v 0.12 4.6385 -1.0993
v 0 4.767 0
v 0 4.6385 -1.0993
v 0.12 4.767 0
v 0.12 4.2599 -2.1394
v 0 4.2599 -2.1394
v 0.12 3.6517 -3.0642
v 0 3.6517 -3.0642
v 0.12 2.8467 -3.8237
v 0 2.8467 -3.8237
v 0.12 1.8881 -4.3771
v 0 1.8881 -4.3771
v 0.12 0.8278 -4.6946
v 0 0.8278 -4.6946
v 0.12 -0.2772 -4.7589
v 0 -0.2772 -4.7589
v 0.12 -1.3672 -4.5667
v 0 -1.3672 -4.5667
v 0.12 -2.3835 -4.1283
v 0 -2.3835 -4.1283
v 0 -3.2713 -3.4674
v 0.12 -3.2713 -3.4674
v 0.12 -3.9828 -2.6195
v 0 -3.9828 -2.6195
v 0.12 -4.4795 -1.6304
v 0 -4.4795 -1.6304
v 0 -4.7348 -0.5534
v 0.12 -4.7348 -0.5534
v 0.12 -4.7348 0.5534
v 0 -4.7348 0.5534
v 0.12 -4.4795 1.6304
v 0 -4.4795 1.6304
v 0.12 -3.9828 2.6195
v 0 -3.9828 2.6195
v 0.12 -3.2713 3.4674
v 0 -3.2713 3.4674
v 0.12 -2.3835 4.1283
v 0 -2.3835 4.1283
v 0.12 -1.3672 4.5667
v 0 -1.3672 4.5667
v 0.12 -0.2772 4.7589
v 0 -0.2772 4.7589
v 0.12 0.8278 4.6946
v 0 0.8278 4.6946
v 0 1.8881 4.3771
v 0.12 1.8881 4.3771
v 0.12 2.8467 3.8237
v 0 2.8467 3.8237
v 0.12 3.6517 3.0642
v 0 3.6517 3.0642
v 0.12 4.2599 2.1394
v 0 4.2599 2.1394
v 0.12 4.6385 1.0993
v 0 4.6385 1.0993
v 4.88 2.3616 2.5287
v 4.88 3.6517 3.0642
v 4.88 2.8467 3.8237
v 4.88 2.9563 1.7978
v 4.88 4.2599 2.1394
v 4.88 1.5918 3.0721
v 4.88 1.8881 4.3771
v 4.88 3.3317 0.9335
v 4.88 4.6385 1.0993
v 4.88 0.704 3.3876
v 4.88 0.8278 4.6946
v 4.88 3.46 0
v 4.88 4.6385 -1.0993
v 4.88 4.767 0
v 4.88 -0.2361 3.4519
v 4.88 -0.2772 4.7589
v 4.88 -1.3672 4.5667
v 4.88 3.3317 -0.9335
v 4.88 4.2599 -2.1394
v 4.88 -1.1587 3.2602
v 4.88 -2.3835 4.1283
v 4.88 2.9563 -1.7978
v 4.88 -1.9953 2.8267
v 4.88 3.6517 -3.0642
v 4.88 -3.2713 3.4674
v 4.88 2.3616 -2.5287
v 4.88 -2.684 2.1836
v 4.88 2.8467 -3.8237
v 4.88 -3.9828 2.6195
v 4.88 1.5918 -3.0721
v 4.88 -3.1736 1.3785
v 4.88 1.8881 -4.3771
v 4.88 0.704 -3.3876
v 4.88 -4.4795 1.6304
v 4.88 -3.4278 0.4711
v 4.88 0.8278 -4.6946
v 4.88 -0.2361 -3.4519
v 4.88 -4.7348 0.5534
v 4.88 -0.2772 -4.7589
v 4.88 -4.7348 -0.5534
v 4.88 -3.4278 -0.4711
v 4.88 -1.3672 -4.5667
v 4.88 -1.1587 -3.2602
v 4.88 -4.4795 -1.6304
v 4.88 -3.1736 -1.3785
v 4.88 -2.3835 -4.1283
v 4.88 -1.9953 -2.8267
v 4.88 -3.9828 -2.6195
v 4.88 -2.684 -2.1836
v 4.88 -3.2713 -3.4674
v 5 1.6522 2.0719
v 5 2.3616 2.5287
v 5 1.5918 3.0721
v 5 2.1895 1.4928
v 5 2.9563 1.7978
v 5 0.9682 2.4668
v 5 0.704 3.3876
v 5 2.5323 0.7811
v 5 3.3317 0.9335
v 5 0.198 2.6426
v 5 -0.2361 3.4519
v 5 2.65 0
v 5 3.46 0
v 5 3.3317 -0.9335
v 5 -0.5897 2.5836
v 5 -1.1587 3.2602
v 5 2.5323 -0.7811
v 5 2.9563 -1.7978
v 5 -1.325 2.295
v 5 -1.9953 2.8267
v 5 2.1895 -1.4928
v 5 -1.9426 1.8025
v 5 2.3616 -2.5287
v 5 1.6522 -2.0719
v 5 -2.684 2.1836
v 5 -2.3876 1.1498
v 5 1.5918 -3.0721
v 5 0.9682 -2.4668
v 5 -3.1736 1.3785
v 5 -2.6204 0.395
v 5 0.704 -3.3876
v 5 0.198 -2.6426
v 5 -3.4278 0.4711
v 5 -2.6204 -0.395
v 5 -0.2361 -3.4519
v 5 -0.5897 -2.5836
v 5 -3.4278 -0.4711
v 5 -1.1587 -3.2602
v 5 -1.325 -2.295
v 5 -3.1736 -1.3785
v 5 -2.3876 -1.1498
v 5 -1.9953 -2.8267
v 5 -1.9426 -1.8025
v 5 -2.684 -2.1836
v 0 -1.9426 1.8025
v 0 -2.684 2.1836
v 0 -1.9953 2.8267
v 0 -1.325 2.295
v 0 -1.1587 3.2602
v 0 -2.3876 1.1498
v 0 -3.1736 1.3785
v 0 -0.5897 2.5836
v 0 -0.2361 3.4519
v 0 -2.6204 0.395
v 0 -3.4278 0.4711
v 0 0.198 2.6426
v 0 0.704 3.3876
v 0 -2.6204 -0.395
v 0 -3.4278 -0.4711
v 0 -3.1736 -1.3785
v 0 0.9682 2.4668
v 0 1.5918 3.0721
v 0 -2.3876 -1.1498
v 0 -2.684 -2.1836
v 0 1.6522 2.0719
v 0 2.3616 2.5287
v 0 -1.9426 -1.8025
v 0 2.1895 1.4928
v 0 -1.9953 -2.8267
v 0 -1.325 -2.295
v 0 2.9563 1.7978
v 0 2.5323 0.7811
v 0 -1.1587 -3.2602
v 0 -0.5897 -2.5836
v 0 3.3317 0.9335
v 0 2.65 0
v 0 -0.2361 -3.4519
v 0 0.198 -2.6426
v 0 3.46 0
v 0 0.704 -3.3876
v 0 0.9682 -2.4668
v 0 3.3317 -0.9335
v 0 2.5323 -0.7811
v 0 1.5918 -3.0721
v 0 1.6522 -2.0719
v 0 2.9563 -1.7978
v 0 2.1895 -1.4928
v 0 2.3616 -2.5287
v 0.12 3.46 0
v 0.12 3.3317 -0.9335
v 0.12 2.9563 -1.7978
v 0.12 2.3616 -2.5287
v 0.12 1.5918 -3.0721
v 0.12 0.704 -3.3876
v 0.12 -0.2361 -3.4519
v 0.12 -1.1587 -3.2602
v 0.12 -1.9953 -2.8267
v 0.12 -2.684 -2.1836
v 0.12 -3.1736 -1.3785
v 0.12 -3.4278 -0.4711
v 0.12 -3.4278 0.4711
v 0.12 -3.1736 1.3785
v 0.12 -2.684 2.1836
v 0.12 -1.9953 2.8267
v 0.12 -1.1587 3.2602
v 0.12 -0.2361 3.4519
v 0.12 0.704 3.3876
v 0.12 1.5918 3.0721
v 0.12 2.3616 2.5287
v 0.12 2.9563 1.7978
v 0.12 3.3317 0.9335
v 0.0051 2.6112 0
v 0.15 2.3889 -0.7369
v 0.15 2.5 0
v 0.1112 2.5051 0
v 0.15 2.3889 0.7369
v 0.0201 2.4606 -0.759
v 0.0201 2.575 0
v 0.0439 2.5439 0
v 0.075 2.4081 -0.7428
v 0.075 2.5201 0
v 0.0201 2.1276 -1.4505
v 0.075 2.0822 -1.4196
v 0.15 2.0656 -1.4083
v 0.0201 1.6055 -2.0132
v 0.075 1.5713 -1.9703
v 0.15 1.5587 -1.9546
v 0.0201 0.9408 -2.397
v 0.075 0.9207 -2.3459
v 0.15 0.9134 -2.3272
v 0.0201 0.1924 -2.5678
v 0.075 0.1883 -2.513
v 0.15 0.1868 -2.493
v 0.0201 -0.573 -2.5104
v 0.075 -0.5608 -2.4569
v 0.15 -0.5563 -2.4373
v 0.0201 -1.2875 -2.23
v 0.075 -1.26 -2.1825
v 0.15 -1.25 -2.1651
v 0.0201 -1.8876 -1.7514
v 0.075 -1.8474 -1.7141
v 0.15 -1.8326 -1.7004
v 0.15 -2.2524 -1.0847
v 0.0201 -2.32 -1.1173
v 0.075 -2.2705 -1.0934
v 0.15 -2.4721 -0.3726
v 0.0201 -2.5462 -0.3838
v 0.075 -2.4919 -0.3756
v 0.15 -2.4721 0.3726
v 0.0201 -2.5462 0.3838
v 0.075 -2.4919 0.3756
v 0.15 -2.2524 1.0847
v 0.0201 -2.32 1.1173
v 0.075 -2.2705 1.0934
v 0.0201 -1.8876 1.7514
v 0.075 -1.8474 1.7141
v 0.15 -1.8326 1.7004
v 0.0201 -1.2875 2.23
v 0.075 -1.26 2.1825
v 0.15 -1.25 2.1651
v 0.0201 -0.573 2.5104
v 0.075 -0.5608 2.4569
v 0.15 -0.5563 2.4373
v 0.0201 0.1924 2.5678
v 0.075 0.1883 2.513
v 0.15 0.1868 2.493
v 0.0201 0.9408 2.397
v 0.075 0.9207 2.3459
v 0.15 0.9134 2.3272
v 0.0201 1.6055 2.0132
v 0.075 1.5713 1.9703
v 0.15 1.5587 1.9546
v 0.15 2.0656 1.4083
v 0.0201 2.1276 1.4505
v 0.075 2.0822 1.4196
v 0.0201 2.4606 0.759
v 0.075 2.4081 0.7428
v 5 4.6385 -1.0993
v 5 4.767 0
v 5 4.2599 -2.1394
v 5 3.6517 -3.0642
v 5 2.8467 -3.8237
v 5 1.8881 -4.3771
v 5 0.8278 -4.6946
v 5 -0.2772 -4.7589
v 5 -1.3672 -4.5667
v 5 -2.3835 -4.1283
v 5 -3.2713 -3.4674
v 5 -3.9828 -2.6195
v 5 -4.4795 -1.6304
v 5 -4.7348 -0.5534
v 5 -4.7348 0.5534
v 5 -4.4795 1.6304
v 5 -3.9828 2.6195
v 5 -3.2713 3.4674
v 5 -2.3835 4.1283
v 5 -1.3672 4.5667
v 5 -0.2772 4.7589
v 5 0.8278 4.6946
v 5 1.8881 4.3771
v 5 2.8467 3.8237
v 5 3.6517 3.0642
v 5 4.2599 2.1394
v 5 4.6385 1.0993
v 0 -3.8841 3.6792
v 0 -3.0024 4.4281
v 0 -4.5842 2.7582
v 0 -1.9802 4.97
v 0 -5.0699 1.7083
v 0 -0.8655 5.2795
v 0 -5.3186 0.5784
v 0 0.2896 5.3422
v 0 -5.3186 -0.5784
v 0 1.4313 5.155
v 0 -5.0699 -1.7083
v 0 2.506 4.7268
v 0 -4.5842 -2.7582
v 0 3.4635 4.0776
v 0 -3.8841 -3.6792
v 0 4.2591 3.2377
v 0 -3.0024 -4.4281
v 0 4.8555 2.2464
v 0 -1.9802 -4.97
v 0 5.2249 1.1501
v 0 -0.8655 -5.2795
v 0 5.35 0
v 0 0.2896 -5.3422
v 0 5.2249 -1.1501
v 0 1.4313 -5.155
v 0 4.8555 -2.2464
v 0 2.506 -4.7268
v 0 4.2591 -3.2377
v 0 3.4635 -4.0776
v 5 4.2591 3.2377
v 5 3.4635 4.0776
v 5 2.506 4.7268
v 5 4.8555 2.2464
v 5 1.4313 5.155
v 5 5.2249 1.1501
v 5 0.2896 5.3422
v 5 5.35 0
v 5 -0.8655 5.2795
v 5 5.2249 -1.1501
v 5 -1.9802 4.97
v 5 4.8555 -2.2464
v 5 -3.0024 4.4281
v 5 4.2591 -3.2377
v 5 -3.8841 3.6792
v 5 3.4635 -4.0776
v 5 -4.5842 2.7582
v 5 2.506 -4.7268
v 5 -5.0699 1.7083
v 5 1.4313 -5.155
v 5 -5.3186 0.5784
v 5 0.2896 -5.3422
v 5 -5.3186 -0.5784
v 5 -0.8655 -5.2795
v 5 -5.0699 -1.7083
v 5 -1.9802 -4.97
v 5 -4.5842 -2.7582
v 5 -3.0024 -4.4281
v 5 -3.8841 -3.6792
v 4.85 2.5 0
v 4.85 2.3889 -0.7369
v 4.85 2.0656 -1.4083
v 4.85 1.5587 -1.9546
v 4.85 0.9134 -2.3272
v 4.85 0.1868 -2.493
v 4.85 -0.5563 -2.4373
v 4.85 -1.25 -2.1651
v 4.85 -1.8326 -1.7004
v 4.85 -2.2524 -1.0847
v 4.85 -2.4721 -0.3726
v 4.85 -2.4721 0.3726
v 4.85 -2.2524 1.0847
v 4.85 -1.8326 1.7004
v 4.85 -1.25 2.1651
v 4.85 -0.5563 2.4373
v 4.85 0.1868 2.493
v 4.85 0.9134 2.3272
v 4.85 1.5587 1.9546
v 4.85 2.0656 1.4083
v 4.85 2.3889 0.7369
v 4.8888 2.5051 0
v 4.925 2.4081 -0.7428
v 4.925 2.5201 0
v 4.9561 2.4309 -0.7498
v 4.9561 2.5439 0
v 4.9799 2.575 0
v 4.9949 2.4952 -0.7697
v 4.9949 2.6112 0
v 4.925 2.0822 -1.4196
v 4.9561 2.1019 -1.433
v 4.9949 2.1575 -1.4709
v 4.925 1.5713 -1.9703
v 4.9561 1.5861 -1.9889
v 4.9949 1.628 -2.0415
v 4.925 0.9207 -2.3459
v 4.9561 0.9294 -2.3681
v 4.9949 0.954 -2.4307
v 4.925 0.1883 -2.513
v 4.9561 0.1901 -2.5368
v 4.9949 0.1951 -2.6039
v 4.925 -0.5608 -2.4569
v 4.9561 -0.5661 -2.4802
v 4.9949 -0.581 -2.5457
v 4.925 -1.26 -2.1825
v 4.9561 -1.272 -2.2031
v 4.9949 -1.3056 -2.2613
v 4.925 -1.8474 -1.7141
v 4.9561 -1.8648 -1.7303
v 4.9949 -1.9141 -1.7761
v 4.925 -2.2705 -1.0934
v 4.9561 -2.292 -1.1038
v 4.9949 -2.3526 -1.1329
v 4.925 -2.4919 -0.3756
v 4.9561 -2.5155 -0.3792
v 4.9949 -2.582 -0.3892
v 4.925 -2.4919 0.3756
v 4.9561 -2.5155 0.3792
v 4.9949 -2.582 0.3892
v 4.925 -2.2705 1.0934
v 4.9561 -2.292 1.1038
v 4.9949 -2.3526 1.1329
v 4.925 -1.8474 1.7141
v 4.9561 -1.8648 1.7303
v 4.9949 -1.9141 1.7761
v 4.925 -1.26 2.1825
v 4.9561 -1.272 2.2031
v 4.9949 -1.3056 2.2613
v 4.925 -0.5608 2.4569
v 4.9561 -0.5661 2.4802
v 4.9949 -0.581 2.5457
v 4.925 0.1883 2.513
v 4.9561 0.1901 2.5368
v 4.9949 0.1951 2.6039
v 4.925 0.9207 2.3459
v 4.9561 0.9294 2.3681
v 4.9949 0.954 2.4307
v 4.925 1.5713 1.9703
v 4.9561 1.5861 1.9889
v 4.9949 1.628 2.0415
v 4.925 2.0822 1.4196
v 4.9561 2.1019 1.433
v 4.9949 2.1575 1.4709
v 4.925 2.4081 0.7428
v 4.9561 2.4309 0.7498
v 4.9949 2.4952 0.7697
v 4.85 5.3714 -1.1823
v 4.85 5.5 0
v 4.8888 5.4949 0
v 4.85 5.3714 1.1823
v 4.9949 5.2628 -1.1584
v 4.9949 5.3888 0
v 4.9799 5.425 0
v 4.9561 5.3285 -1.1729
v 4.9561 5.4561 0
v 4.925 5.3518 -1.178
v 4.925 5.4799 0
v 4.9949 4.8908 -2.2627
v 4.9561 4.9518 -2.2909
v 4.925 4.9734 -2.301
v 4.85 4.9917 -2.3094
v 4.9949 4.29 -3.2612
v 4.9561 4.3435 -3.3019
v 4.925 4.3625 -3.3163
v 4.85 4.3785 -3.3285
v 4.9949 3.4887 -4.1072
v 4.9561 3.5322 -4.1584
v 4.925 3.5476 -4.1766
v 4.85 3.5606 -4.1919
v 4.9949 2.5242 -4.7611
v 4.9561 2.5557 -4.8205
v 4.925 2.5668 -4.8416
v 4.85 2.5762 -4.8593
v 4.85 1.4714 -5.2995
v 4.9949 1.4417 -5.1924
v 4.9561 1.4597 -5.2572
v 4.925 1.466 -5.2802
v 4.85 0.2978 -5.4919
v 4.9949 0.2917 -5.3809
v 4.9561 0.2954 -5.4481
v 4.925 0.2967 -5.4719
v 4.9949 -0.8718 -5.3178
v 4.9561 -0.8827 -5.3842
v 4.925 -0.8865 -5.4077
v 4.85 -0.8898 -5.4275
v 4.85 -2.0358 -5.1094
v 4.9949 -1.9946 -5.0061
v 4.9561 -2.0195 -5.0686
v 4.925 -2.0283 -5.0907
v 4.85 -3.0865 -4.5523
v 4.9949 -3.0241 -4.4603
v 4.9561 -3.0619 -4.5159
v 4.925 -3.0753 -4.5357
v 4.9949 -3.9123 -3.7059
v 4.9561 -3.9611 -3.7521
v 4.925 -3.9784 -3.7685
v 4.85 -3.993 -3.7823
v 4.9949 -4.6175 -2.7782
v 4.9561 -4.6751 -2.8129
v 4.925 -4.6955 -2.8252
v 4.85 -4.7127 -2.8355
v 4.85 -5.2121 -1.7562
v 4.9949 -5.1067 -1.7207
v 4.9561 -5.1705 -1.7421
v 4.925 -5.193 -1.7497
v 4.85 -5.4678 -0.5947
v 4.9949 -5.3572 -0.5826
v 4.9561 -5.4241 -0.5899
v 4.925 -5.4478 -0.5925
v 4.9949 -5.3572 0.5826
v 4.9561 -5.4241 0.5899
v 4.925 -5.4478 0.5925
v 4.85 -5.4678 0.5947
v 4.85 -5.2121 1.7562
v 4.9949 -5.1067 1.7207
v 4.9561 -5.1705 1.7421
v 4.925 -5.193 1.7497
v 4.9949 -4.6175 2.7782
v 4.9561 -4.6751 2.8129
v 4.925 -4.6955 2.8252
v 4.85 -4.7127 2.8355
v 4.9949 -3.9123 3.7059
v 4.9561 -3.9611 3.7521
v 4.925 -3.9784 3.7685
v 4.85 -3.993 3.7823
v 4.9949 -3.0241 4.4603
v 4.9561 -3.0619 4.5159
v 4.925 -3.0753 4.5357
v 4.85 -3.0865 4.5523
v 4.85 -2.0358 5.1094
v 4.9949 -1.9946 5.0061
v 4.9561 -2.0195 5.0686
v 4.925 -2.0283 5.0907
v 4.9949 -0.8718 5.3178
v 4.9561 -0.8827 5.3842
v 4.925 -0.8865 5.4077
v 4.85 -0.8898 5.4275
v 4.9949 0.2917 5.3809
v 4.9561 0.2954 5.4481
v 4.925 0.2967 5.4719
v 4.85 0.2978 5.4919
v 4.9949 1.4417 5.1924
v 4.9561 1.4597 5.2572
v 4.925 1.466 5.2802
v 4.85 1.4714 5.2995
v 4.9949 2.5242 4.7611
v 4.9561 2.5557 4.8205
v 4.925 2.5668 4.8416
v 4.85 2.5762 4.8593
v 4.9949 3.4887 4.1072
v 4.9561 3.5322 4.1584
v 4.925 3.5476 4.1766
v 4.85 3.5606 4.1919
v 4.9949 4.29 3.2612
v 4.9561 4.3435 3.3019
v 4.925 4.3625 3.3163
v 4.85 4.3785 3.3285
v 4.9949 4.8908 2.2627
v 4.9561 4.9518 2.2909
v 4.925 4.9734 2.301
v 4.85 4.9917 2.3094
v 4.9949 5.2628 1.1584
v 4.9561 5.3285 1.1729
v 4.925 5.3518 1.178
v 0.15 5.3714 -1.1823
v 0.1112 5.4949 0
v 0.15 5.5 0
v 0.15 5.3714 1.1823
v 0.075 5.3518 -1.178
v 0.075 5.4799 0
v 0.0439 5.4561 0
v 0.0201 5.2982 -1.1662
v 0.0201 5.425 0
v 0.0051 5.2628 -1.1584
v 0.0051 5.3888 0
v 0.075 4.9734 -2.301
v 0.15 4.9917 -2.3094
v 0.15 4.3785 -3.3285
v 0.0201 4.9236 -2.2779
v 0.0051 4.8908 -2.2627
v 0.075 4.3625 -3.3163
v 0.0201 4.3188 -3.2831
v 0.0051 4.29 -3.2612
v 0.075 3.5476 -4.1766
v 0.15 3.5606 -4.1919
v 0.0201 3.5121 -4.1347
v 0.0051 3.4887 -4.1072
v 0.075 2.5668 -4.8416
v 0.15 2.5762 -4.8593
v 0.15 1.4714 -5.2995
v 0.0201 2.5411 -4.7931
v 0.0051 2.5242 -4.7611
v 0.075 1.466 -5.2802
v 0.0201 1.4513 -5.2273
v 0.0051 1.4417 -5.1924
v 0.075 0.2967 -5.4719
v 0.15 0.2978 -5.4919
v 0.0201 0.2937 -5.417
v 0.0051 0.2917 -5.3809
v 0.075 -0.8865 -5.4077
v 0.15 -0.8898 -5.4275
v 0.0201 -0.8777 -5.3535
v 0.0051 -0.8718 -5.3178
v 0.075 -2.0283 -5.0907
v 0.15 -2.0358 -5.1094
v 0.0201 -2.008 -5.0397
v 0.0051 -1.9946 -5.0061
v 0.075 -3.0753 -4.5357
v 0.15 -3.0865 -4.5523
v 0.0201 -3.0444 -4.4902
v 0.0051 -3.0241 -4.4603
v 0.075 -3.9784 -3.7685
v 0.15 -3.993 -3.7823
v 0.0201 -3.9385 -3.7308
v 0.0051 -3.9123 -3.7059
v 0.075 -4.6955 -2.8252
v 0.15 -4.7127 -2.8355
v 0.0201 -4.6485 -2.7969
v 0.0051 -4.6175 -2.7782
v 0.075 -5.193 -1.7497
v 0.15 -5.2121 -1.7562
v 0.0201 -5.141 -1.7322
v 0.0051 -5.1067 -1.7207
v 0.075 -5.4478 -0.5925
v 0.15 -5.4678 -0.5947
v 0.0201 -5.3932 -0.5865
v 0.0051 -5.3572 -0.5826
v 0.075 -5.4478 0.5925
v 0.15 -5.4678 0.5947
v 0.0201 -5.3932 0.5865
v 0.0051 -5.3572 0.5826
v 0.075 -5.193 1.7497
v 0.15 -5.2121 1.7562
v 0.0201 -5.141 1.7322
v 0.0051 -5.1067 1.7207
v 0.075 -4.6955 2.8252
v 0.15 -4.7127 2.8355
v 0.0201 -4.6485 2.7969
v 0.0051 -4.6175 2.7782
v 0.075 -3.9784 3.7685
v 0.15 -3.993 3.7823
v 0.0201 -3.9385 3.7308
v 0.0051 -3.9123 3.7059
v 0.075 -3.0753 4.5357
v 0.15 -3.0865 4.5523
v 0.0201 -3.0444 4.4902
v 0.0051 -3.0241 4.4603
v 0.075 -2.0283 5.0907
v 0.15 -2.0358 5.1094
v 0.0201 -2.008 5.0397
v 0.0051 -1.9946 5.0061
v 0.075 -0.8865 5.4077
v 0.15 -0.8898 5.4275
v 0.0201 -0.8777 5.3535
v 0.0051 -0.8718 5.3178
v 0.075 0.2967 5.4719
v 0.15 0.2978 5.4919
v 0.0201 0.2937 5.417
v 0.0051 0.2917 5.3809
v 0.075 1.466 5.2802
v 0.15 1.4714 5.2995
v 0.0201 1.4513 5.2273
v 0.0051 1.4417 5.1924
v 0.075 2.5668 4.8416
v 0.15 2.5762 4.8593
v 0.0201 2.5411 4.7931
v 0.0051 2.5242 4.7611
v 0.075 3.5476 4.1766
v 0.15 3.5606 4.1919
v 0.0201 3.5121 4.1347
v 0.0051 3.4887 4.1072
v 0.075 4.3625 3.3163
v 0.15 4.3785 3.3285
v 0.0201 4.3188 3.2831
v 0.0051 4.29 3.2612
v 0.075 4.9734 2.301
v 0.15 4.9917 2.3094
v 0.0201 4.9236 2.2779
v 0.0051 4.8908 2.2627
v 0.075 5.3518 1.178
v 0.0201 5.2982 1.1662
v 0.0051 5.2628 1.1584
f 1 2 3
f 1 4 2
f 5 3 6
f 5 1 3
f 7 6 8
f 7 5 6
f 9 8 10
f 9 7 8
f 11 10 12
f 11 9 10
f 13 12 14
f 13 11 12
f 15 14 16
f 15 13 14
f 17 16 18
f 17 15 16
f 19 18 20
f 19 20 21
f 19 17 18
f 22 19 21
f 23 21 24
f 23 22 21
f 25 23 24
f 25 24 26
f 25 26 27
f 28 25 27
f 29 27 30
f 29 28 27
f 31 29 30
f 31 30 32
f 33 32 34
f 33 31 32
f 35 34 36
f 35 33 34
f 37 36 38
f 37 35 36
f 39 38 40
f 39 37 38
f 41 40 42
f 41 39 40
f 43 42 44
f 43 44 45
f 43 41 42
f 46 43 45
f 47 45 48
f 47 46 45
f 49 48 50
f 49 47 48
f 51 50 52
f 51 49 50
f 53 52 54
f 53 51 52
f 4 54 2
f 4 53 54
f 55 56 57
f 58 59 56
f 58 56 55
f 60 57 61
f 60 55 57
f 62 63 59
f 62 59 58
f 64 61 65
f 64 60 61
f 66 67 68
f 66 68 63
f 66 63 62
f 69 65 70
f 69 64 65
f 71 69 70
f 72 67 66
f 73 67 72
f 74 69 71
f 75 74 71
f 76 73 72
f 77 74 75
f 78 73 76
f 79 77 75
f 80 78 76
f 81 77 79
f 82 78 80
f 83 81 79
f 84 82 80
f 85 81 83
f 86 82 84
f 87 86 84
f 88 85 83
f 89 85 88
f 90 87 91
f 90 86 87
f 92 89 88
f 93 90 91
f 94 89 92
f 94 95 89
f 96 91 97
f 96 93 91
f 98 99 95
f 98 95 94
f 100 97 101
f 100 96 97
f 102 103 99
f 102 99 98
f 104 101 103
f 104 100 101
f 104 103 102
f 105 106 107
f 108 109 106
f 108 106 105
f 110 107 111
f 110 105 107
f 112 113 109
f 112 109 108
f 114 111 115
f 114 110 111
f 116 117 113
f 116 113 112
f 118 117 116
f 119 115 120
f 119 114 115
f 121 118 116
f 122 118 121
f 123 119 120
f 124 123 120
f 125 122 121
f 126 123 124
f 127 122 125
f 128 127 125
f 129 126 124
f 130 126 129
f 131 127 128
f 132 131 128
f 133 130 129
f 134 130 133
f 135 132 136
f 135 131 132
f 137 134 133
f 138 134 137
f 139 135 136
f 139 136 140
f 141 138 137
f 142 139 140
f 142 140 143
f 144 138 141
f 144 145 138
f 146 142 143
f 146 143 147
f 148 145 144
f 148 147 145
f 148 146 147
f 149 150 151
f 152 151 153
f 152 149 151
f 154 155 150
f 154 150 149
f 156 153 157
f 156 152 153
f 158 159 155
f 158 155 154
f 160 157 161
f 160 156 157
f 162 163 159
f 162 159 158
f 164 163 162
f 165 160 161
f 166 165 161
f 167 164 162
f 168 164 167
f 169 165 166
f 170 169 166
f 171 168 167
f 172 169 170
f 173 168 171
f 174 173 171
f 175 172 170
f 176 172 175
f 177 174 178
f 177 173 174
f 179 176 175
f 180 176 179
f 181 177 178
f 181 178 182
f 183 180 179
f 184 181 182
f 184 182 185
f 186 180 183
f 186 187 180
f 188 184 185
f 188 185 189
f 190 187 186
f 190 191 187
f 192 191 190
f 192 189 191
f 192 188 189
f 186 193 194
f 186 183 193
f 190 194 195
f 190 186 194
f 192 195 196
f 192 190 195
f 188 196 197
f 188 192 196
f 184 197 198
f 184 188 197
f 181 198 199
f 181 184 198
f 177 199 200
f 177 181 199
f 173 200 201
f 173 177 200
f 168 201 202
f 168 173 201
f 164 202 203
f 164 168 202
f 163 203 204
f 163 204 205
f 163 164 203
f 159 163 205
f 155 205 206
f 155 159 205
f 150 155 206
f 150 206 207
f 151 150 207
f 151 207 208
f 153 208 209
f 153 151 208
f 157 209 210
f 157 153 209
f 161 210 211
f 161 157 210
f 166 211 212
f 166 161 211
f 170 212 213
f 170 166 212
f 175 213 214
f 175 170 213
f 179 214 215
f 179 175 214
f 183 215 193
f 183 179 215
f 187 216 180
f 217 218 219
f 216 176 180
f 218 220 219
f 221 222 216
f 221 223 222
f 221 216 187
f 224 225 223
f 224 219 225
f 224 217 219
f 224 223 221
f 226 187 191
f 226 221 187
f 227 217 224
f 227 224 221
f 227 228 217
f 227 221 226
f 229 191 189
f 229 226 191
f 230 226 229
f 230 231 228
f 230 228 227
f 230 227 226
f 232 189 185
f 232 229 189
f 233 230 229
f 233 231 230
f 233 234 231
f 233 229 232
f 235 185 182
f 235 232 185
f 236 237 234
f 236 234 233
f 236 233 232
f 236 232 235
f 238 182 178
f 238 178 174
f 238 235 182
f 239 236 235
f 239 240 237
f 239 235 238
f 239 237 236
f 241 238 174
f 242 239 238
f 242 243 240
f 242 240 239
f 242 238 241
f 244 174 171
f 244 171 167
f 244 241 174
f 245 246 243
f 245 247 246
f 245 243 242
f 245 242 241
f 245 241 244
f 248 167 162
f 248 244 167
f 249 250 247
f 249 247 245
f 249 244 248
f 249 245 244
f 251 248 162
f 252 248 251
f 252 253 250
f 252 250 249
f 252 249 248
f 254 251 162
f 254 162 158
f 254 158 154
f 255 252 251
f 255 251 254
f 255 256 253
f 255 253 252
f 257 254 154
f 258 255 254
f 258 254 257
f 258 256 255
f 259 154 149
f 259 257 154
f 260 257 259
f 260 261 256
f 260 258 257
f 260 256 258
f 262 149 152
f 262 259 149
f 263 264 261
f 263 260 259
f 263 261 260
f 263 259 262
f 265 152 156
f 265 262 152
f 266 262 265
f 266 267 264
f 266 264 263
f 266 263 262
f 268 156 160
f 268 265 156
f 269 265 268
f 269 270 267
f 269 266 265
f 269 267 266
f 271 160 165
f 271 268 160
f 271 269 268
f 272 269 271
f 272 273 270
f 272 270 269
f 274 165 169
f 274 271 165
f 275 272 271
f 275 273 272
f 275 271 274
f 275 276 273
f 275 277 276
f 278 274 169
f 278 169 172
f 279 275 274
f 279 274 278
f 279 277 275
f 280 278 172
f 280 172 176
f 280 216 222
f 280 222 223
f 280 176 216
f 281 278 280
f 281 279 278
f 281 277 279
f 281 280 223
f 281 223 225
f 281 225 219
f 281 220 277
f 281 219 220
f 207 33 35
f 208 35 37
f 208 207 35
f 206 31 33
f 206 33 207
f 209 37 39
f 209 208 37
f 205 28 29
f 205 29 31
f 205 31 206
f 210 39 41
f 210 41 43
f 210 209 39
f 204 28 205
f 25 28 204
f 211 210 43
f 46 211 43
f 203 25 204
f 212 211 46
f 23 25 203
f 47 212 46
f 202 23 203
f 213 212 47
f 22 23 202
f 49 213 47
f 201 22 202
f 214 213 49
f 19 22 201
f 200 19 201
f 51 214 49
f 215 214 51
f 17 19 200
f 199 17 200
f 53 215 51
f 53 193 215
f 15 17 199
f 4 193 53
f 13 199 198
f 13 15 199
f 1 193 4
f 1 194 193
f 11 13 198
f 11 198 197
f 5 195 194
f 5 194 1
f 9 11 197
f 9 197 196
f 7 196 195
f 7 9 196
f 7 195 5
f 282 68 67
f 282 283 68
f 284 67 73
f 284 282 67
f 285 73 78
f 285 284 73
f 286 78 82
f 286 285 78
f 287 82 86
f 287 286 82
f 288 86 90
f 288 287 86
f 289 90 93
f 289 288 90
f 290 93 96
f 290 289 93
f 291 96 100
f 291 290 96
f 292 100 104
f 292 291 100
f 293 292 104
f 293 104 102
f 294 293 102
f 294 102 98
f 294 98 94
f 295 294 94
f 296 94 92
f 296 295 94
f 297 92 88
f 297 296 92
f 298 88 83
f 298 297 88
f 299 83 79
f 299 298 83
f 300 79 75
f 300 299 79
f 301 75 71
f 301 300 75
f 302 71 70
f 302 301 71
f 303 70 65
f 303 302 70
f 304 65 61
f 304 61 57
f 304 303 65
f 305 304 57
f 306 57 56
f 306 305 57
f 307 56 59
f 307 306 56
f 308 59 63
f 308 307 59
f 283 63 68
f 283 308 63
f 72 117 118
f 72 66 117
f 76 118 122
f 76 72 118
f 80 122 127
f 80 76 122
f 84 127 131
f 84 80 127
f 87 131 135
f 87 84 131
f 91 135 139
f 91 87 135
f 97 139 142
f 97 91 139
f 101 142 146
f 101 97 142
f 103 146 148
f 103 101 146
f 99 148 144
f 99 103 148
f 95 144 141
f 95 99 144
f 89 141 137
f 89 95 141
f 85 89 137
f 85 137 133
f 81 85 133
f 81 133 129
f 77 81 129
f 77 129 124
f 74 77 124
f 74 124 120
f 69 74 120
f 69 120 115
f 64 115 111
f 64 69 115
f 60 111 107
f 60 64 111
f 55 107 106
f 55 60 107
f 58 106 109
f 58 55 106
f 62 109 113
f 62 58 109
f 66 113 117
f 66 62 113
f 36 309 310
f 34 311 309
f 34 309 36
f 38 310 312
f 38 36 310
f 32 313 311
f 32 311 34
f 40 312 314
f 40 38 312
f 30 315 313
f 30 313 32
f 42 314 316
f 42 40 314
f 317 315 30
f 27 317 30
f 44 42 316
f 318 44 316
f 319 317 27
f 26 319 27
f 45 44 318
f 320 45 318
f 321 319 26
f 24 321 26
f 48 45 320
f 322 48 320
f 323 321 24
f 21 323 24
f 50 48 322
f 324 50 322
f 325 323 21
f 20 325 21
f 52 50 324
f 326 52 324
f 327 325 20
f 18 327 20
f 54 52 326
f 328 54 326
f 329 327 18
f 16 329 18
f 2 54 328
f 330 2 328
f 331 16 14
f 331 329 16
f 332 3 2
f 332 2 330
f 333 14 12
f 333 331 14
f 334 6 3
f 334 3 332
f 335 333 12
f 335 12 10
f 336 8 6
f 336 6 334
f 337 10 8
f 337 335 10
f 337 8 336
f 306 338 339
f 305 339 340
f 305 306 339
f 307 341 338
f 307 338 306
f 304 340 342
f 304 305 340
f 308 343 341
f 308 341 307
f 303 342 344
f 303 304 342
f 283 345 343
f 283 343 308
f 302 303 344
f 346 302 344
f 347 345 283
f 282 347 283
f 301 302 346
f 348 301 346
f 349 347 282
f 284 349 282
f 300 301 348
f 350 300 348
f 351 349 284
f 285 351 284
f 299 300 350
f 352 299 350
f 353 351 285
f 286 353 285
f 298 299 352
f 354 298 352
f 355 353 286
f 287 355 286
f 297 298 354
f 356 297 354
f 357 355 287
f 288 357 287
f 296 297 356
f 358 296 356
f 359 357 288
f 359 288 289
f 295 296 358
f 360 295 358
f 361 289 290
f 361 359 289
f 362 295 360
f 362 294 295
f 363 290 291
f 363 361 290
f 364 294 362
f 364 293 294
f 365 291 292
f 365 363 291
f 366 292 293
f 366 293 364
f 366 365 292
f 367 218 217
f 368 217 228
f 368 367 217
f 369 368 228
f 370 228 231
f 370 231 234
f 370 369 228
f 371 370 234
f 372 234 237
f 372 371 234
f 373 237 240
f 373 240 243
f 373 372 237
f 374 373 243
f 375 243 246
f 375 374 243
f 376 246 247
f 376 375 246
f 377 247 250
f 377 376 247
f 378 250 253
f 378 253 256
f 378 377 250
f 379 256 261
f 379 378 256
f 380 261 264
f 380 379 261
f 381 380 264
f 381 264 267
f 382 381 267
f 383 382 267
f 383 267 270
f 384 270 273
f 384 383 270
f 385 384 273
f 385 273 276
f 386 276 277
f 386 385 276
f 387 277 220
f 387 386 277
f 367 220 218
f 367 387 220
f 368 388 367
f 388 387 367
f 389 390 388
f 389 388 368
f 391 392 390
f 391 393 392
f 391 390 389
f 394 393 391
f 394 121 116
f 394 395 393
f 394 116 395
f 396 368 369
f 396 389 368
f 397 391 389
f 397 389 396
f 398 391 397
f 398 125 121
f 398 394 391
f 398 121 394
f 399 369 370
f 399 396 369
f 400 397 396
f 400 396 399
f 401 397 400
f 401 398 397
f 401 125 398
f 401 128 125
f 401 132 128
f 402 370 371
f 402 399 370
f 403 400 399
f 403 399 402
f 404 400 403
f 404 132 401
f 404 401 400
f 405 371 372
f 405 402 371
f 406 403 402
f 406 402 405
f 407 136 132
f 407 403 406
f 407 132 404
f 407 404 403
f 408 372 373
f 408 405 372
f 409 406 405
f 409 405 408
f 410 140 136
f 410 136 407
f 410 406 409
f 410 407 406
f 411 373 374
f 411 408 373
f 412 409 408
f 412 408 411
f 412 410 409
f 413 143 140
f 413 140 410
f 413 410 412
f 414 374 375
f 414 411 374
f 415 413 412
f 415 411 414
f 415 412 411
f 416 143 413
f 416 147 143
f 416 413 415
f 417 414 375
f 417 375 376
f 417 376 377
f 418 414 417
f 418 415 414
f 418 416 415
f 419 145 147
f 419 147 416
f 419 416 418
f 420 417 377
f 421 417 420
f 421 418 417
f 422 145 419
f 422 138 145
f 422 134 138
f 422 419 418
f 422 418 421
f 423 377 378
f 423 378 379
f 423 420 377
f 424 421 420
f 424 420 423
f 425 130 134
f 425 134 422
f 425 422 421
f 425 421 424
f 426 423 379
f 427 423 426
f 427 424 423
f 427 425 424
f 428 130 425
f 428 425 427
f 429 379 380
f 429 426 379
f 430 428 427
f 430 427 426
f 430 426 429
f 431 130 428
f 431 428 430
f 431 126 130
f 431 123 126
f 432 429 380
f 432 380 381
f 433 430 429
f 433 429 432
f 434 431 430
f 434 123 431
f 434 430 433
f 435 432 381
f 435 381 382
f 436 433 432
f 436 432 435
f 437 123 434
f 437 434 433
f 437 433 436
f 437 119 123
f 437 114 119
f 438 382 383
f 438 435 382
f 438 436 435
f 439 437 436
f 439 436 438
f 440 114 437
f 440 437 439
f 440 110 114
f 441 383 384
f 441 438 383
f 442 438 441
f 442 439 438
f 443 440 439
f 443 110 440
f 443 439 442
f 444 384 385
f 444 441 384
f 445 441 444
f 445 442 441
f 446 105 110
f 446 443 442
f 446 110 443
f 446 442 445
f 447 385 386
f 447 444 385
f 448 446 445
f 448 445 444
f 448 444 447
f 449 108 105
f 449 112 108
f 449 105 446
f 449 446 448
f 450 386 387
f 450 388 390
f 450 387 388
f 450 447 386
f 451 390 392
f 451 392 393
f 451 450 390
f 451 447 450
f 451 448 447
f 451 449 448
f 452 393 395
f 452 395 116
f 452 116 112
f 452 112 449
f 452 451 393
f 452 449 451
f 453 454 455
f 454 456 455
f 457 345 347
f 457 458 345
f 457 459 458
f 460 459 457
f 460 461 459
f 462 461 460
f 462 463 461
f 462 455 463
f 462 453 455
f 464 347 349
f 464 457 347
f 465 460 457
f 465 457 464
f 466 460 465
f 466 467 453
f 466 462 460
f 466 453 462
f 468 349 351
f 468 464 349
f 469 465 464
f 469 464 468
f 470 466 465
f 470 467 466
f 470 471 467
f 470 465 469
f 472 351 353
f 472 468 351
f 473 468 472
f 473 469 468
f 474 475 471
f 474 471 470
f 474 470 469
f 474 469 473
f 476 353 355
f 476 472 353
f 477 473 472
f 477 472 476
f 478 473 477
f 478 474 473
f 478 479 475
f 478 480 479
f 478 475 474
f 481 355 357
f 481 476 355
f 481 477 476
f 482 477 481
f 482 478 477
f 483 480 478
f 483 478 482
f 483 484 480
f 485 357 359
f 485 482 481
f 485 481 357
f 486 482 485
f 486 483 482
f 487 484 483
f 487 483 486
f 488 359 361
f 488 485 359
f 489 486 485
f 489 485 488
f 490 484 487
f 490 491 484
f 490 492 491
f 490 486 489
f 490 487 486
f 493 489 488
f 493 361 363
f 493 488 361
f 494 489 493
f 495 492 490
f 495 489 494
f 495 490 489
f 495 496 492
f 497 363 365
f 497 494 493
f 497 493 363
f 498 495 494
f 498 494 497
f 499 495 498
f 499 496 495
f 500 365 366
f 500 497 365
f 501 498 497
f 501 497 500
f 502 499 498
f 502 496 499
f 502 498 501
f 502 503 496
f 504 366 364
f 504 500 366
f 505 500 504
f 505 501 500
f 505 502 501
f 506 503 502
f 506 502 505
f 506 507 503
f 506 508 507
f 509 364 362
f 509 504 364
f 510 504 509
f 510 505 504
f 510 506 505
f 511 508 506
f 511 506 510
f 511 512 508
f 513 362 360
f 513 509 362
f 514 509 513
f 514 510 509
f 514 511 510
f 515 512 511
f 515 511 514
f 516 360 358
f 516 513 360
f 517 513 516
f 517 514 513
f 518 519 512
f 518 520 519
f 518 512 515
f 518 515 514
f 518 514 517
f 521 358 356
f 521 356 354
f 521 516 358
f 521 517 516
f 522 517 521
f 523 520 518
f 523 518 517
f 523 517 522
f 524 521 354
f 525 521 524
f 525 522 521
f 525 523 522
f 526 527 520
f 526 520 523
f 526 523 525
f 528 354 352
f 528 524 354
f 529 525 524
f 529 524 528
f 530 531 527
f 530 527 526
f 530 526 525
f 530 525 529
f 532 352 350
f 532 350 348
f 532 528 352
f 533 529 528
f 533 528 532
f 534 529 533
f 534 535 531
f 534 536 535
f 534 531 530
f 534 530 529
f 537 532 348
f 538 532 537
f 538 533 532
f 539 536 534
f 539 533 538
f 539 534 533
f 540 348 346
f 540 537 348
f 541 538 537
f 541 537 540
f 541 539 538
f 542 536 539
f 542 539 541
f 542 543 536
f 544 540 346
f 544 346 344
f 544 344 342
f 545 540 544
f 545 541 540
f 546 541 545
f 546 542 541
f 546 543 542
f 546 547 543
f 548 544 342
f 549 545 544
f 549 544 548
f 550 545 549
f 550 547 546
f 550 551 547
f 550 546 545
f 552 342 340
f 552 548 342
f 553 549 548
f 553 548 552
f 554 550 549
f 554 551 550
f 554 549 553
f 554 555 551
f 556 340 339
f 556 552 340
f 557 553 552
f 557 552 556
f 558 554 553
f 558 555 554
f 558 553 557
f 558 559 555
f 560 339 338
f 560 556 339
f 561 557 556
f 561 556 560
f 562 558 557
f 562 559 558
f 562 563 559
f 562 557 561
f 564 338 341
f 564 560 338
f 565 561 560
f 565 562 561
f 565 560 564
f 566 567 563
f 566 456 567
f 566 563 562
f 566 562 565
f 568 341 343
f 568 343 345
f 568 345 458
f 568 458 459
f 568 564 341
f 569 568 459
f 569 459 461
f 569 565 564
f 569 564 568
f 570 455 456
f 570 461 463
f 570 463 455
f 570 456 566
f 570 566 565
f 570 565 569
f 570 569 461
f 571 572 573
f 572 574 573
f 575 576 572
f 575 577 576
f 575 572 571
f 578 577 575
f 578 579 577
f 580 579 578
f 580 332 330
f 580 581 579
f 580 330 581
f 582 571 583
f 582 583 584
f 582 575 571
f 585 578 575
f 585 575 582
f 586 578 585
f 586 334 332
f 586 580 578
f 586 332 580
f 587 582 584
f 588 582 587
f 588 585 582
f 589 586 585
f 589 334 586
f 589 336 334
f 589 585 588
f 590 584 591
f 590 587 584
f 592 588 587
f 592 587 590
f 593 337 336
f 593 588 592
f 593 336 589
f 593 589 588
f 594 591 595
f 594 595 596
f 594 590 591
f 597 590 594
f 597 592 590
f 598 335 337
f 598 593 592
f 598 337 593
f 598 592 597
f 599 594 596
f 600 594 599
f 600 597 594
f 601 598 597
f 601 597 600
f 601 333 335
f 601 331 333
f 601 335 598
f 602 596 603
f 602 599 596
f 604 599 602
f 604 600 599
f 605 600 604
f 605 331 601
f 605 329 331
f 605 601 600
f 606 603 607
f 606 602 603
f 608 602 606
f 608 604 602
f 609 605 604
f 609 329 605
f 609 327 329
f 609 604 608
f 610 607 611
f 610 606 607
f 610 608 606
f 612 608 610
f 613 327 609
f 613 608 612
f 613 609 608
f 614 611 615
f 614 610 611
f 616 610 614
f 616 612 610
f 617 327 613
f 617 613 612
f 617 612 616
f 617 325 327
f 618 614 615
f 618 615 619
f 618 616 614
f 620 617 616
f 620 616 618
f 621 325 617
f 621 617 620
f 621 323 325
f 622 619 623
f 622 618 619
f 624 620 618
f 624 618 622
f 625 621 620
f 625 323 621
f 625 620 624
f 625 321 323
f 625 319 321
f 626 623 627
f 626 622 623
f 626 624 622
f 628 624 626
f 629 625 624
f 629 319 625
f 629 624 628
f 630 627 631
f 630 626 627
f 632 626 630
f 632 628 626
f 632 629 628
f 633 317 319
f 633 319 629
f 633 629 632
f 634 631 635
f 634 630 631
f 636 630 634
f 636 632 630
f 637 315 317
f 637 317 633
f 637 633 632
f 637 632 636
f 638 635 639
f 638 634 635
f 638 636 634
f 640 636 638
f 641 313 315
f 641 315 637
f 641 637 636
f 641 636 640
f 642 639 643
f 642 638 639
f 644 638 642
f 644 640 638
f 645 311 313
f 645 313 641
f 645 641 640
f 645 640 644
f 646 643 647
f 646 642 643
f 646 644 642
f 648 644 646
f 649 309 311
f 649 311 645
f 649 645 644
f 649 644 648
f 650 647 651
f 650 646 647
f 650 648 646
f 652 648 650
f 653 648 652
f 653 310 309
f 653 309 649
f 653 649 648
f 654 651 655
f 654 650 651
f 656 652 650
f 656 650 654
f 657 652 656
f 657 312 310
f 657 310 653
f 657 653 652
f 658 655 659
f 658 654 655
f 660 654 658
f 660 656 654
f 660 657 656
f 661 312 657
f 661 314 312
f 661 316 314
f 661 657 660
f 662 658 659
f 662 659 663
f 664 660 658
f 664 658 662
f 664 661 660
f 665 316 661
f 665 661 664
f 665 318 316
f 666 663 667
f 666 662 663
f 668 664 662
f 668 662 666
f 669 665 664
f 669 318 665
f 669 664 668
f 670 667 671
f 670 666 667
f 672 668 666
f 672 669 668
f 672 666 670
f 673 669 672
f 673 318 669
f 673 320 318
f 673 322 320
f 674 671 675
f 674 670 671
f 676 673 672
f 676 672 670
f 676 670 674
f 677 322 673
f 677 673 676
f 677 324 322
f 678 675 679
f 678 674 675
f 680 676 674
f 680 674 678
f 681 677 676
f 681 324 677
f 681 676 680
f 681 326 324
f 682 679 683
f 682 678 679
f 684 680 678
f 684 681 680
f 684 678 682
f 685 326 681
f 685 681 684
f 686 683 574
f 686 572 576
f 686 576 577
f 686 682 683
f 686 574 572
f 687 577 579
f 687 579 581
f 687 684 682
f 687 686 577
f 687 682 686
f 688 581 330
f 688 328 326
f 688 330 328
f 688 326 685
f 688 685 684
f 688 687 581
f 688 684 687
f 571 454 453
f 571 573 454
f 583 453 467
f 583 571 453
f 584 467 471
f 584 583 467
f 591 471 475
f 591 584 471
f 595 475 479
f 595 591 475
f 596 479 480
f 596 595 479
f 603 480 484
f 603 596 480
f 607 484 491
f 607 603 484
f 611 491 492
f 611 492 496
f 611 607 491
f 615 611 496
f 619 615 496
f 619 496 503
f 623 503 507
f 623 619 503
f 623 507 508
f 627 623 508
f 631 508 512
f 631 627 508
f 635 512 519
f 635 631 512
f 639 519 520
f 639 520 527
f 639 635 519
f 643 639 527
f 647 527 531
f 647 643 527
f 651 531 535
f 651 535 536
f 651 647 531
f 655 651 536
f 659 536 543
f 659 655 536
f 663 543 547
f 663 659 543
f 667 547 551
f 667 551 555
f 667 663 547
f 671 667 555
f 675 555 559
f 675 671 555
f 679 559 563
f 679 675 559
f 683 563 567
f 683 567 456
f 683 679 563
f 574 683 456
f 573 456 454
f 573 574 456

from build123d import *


with BuildPart() as part:
    # Sketch1 → Revolve1 (revolve)
    with BuildSketch(Plane.XY):
        with BuildLine():
            Line((0, 5.35), (0, 4.767))
            Line((0, 4.767), (0.12, 4.767))
            Line((0.12, 4.767), (0.12, 3.46))
            Line((0.12, 3.46), (0, 3.46))
            Line((0, 3.46), (0, 2.65))
            ThreePointArc((0, 2.65), (0.043933983, 2.543933983), (0.15, 2.5))
            Line((0.15, 2.5), (4.85, 2.5))
            ThreePointArc((4.85, 2.5), (4.956066017, 2.543933983), (5, 2.65))
            Line((5, 2.65), (5, 3.46))
            Line((5, 3.46), (4.88, 3.46))
            Line((4.88, 3.46), (4.88, 4.767))
            Line((4.88, 4.767), (5, 4.767))
            Line((5, 4.767), (5, 5.35))
            ThreePointArc((5, 5.35), (4.956066017, 5.456066017), (4.85, 5.5))
            Line((4.85, 5.5), (0.15, 5.5))
            ThreePointArc((0.15, 5.5), (0.043933983, 5.456066017), (0, 5.35))
        make_face()
    revolve(axis=Axis((4.85, 0, 0), (-1, 0, 0)))


solid = part.part
